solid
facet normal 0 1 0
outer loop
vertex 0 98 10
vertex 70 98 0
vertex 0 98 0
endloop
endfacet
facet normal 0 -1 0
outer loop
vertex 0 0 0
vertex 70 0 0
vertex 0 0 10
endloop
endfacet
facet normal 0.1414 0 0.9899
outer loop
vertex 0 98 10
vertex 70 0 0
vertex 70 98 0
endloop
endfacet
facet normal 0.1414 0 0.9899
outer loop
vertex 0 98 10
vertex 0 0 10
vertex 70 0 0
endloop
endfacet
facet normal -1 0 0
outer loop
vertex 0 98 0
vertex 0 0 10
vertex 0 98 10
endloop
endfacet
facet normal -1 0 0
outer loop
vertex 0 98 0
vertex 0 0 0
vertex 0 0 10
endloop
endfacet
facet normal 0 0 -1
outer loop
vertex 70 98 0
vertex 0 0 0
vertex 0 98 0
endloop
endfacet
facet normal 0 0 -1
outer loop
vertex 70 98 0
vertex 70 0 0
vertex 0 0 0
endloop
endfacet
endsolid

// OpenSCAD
$fn = 50;

card_space_width = 98;

height = 70;
depth = 10;

module triangular_prism(width, height, depth, distance=0) {
  translate([0, depth, width]) {
    rotate([90, 90, 0]) {
      linear_extrude(depth) {
        polygon([[0, 0], [width, 0], [(distance == 0) ? (width / 2) : distance, height]]);
      }
    }
  }
}

module card_slope(height, depth, width=card_space_width) {
  triangular_prism(depth, height, width, depth);
}

card_slope(height, depth);
